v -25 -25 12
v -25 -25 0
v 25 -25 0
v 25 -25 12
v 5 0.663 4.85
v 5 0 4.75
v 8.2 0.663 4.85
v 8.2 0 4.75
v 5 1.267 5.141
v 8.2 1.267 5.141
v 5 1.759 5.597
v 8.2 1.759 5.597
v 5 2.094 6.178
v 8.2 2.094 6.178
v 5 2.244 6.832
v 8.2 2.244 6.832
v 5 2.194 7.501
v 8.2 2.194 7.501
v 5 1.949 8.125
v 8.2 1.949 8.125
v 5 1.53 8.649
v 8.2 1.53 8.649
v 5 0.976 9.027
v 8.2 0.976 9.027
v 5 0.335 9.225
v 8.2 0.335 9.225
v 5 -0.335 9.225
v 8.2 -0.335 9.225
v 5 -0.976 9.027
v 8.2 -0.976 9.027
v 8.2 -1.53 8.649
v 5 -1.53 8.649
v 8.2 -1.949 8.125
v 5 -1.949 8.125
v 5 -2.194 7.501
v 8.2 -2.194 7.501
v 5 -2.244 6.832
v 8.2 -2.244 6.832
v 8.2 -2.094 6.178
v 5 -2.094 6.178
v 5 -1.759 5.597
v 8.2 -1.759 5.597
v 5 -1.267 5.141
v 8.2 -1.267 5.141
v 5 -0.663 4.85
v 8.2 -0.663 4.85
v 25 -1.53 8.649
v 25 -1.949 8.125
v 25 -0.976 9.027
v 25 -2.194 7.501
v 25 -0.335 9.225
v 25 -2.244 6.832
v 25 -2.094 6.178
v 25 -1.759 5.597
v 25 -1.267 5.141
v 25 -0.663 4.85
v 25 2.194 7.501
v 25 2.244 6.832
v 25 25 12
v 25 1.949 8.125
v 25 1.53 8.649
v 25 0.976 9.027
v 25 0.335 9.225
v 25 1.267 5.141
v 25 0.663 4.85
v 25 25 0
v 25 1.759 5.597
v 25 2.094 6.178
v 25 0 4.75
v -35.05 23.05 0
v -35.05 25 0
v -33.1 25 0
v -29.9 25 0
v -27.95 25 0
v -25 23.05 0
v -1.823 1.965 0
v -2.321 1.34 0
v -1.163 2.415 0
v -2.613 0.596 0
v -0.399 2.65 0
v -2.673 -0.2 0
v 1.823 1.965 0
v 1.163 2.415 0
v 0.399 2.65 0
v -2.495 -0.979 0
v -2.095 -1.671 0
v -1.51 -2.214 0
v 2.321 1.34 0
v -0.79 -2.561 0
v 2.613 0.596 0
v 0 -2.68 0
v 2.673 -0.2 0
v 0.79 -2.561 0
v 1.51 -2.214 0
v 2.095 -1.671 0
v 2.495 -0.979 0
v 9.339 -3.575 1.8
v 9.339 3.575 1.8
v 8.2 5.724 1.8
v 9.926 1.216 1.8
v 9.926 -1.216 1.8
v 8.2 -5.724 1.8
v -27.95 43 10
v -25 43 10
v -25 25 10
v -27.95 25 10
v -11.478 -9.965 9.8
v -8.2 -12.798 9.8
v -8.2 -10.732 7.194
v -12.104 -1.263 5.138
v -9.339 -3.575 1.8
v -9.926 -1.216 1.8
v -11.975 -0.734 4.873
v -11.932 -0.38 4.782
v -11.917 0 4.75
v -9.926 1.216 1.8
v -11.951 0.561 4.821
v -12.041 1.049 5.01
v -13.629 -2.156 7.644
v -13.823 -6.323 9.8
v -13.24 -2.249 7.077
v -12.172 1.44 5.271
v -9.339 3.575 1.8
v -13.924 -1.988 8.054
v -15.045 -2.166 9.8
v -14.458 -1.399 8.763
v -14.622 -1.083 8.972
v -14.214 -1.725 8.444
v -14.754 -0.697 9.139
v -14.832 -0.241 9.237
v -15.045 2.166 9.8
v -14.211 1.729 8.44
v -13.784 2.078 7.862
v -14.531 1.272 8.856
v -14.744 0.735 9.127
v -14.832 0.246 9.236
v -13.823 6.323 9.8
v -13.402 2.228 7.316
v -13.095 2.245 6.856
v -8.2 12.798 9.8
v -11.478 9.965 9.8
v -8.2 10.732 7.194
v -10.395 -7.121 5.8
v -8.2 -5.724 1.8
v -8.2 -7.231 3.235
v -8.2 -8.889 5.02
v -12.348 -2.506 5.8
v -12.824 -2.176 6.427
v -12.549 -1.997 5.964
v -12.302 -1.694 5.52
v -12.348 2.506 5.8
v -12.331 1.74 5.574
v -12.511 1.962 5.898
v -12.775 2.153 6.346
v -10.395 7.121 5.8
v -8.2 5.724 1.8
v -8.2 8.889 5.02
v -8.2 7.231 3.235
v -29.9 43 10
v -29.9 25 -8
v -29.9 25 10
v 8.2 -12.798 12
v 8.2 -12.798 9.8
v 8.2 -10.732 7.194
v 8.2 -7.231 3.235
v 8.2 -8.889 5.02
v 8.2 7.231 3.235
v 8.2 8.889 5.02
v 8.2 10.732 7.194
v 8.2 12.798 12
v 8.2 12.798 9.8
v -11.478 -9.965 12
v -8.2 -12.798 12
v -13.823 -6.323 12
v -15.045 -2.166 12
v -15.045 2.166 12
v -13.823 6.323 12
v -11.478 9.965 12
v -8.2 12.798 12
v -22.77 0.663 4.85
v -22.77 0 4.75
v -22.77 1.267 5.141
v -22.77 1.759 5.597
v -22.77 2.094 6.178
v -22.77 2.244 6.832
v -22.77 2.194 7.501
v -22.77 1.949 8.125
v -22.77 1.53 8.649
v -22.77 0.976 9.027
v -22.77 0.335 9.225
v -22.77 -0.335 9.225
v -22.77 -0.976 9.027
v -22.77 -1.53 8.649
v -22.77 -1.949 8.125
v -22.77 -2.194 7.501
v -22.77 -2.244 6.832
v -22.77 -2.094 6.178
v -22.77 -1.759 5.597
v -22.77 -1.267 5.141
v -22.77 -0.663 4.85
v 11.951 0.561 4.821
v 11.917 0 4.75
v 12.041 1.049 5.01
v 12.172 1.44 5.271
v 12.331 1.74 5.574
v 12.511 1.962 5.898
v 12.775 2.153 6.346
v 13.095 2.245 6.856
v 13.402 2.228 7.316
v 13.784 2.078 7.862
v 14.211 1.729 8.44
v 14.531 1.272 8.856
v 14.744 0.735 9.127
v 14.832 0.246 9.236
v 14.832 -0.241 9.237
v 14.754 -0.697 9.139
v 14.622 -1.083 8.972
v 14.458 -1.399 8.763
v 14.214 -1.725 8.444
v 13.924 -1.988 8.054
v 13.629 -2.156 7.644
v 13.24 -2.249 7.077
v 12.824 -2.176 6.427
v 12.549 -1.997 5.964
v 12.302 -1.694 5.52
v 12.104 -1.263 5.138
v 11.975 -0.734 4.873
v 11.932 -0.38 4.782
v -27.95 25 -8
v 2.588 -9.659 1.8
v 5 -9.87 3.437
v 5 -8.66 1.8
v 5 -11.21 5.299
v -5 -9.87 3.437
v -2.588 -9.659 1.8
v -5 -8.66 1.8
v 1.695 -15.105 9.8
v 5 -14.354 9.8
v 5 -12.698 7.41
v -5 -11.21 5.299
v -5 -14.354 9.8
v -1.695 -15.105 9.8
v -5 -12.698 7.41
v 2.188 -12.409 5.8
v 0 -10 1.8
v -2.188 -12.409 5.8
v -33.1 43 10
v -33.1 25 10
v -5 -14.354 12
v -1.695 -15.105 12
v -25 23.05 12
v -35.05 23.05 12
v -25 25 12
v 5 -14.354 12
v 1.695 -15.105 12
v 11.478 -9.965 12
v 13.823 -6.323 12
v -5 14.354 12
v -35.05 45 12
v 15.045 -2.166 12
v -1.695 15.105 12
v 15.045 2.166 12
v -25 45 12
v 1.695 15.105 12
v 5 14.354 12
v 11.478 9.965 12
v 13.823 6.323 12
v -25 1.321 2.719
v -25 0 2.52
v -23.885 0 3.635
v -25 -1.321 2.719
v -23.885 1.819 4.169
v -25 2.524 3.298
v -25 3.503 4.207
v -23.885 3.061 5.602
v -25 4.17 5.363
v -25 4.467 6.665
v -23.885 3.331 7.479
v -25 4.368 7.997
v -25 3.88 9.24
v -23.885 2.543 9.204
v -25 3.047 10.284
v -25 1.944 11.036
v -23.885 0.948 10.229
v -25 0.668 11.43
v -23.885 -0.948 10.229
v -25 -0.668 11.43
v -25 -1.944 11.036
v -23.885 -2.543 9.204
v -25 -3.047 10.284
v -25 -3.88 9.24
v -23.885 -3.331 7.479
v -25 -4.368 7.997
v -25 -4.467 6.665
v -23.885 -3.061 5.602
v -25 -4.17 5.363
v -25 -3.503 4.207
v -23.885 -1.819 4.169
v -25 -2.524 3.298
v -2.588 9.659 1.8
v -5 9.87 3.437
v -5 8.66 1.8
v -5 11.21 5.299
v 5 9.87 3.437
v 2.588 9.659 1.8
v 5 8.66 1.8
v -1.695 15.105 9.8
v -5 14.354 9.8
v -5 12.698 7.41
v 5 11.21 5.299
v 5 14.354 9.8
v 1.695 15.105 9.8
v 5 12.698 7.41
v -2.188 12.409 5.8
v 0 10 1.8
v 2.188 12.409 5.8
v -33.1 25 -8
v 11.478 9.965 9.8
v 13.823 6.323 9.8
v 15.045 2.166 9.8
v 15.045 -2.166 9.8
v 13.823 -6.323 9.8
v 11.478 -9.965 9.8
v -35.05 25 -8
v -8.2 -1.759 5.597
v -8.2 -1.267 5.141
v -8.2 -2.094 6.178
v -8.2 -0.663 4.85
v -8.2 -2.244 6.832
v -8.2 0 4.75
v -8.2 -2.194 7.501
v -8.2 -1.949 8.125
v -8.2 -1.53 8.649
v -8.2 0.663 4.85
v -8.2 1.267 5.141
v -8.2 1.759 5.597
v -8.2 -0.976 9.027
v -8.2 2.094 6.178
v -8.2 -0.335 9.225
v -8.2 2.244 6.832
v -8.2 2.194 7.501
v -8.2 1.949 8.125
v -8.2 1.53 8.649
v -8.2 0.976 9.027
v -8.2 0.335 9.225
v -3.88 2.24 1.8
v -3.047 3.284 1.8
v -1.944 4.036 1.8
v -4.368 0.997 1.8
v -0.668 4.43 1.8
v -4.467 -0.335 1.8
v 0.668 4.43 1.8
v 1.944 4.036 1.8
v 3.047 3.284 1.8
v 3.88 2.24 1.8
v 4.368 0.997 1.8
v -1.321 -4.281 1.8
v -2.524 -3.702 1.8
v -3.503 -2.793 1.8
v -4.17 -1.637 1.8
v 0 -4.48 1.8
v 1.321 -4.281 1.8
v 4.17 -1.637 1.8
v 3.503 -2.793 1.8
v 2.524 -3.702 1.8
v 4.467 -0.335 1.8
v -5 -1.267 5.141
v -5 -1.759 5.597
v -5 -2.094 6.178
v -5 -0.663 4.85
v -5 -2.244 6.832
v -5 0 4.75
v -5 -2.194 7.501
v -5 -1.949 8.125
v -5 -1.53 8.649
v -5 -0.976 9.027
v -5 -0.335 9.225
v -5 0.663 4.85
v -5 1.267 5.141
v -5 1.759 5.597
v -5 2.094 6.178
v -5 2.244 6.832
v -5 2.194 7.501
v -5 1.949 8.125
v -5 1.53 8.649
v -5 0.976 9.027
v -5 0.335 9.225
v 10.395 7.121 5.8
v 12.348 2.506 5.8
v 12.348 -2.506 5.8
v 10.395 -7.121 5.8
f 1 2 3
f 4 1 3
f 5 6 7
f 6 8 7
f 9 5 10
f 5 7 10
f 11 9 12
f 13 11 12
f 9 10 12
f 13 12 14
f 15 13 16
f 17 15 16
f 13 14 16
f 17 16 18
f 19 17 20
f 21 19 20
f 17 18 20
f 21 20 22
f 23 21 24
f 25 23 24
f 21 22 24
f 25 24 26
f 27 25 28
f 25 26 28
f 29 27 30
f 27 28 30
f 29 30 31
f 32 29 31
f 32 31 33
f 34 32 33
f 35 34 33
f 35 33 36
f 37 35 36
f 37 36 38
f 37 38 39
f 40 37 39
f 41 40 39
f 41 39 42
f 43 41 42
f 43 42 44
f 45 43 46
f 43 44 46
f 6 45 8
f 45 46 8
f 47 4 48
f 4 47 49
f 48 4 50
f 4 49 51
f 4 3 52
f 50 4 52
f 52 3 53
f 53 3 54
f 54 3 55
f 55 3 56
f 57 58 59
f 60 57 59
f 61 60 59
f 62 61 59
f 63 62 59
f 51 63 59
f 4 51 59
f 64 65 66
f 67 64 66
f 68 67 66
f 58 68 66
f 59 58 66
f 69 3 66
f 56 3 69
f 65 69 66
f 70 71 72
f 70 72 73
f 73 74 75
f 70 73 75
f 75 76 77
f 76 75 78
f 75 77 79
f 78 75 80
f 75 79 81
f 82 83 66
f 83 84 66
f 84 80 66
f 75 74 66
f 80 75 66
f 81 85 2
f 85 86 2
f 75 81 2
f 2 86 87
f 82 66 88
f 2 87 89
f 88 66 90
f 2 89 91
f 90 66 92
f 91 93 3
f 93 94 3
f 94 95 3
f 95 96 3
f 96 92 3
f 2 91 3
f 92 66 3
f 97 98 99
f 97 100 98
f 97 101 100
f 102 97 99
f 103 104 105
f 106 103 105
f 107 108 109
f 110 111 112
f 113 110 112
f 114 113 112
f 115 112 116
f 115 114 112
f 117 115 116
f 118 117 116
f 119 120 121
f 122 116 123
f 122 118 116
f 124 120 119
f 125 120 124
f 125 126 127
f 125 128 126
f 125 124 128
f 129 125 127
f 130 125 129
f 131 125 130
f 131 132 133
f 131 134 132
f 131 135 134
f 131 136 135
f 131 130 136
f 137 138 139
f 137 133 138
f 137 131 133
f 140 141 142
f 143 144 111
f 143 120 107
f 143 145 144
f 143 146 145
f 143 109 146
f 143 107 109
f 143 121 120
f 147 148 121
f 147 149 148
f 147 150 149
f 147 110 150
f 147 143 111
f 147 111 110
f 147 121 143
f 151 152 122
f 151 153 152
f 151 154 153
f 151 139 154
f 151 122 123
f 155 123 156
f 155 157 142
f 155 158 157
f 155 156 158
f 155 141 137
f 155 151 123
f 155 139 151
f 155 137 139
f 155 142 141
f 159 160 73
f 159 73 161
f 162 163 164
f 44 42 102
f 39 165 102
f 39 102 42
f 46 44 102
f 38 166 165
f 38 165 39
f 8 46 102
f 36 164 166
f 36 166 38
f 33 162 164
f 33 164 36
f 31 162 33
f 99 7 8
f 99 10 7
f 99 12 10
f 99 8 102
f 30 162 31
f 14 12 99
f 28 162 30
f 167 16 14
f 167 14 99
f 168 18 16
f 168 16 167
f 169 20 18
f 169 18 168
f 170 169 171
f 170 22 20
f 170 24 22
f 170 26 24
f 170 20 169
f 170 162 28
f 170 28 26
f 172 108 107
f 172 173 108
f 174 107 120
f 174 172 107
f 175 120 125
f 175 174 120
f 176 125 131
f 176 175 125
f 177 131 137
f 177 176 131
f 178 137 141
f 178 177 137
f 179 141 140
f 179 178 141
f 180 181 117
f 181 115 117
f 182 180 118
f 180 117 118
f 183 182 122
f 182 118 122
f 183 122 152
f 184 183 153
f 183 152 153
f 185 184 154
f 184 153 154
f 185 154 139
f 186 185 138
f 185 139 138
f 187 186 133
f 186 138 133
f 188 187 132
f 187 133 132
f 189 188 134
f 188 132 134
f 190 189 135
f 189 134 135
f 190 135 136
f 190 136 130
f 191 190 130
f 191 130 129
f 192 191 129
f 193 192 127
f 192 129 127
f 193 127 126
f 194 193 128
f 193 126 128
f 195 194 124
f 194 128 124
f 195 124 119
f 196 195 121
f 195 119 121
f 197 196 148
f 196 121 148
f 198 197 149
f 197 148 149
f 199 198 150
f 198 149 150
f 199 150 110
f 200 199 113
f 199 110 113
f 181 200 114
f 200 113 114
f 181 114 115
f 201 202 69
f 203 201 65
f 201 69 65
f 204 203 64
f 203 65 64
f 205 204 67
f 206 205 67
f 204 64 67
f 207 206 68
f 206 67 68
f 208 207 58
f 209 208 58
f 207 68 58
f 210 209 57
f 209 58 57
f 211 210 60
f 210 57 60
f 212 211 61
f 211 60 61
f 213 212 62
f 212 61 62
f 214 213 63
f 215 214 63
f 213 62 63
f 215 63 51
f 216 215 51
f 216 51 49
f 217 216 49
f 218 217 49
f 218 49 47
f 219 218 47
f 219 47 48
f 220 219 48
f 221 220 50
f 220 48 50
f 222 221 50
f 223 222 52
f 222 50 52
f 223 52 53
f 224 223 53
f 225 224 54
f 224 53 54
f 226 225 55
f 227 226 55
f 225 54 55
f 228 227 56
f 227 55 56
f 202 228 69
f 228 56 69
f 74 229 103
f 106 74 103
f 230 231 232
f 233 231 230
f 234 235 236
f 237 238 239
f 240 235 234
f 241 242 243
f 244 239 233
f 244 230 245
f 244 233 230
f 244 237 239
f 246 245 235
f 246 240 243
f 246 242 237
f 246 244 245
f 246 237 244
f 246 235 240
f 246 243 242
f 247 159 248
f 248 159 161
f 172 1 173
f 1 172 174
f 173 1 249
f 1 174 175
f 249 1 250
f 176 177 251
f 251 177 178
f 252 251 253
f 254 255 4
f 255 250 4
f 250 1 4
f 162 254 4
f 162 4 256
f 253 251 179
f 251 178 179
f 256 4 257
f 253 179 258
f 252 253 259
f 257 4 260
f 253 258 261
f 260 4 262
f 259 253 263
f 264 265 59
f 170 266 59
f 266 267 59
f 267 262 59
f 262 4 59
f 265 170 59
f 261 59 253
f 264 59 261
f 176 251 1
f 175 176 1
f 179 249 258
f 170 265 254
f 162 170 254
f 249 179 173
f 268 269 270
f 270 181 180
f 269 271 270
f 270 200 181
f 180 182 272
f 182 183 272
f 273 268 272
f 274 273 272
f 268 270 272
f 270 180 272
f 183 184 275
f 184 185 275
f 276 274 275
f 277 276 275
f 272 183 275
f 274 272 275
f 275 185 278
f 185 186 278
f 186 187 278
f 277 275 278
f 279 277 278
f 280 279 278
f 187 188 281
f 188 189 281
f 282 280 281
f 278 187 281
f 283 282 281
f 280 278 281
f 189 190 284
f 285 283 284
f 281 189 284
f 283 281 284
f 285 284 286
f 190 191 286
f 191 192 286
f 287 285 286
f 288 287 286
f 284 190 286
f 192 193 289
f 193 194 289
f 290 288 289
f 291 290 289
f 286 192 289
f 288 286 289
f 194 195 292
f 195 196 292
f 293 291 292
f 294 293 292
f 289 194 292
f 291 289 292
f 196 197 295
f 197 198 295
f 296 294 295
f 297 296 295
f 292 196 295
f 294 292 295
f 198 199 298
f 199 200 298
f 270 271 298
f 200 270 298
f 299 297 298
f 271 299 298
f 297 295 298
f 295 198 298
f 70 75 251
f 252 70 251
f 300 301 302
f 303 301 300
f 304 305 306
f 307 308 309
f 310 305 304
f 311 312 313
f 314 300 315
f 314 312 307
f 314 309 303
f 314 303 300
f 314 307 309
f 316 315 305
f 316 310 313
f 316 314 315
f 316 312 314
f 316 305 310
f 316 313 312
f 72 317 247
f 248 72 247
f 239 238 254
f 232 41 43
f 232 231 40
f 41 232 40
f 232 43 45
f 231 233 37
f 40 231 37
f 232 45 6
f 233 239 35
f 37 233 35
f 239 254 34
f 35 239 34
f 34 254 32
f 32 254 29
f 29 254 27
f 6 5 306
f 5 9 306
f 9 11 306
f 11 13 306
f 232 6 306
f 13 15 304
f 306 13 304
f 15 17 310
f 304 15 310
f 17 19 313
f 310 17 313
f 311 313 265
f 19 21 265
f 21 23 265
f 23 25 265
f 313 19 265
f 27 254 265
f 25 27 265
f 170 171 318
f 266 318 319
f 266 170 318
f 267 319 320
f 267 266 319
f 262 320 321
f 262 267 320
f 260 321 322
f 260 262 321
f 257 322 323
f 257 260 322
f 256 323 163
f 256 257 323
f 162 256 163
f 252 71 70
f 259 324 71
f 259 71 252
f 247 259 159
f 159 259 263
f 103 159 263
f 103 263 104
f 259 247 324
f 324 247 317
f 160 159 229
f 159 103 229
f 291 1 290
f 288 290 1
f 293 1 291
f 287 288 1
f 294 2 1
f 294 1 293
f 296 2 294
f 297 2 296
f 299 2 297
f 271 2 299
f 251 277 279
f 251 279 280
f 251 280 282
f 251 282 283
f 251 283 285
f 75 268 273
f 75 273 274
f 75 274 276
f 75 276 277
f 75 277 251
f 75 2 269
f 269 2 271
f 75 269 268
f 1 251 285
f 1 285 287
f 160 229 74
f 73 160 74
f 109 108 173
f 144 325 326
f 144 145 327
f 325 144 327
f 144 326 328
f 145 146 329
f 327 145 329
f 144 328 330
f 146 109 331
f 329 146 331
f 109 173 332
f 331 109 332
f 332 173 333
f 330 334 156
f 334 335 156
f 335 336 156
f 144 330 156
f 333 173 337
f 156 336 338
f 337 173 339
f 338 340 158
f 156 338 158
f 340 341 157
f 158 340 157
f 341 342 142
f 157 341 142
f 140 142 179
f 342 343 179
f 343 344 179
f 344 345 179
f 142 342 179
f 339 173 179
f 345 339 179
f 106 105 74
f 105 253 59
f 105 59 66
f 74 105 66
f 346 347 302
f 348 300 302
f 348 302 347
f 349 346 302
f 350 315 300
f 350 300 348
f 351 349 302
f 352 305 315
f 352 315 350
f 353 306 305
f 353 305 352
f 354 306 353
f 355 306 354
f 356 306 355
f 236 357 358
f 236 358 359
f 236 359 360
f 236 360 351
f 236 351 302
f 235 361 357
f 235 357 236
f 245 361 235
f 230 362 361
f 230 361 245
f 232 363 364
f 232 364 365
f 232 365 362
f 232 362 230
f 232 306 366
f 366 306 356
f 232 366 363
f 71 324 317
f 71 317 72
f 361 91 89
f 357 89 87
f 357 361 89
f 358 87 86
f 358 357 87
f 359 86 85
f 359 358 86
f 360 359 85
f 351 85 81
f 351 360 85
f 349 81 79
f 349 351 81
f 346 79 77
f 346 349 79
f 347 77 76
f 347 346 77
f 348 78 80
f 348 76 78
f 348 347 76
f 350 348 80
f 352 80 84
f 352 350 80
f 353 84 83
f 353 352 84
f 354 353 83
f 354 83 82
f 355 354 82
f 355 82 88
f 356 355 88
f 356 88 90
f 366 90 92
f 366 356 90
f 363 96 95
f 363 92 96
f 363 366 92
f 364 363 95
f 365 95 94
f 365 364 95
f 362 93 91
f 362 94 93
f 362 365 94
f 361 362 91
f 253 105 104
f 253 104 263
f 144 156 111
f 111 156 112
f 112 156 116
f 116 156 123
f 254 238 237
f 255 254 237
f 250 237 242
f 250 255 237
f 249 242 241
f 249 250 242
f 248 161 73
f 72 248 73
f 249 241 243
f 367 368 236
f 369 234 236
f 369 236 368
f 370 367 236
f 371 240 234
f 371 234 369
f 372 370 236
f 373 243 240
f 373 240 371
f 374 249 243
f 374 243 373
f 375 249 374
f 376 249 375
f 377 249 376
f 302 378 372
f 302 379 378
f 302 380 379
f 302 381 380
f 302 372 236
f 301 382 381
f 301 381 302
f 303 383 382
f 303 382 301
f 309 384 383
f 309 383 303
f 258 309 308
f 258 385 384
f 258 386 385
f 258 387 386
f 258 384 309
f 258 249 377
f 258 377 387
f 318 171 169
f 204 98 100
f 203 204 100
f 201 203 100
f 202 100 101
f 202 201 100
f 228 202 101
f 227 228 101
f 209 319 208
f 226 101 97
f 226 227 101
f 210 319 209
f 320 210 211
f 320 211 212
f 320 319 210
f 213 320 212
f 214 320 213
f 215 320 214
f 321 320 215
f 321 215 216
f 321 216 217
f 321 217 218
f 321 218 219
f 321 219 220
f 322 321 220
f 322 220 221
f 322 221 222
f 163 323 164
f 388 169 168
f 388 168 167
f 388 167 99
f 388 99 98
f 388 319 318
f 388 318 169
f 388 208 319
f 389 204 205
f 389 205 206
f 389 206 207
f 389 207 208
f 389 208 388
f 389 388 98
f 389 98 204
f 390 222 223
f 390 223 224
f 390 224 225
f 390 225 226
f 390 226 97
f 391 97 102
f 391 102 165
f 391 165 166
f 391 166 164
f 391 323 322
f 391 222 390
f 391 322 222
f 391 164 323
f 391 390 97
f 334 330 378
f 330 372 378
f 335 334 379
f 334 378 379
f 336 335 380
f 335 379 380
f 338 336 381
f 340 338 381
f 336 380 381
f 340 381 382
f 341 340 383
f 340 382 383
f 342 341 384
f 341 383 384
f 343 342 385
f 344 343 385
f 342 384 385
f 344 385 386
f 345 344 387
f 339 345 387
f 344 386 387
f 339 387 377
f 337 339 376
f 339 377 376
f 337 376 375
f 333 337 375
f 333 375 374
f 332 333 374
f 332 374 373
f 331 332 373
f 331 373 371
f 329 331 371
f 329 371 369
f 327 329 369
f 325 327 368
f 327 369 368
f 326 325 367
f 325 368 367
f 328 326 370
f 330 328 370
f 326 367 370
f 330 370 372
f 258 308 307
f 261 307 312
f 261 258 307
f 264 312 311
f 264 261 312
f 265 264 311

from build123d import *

# Parameters (mm, degrees)
CROQUIS1_W                                           = 50
CROQUIS1_H                                           = 50
CROQUIS1_R                                           = 2
SALIENTE_EXTRUIR2_DEPTH                              = 12
CROQUIS4_W                                           = 3.2
CROQUIS4_H                                           = 40
SALIENTE_EXTRUIR5_DEPTH                              = 10.2
CORTAR_EXTRUIR2_START                                = -50
CROQUIS7_R                                           = 2
CORTAR_EXTRUIR2_DEPTH                                = 50
REFRENTADO_PARA_TORNILLO_TAP_N_CON_CABEZ_D           = 4.5
REFRENTADO_PARA_TORNILLO_TAP_N_CON_CABEZ_CSINK_D     = 8.96
REFRENTADO_PARA_TORNILLO_TAP_N_CON_CABEZ_CSINK_ANGLE = 90
SALIENTE_EXTRUIR14_DEPTH                             = 10.05
SALIENTE_EXTRUIR15_START                             = 2.95
SALIENTE_EXTRUIR15_DEPTH                             = 1.95
SALIENTE_EXTRUIR16_START                             = 10.05
SALIENTE_EXTRUIR16_DEPTH                             = 1.95


with BuildPart() as part:
    # Croquis1 → Saliente-Extruir2 (new body)
    with BuildSketch(Plane.XY):
        Rectangle(CROQUIS1_W, CROQUIS1_H)
        Circle(CROQUIS1_R, mode=Mode.SUBTRACT)
    extrude(amount=SALIENTE_EXTRUIR2_DEPTH)

    # Croquis2 → Cortar-Revolución1 (revolve, cut)
    with BuildSketch(Plane(origin=(0, 0, 0), x_dir=(0, 0, -1), z_dir=(1, 0, 0))):
        Polygon((-12, 15.2), (-12, 0), (-1.8, 0), (-1.8, 10), (-9.8, 15.2), align=None)
    revolve(axis=Axis((0, 0, 12), (0, 0, -1)), mode=Mode.SUBTRACT)

    # Croquis4 → Saliente-Extruir5 (add)
    with BuildSketch(Plane.XY.offset(12)):
        with Locations((-6.6, 0)):
            Rectangle(CROQUIS4_W, CROQUIS4_H)
        with Locations((6.6, 0)):
            Rectangle(CROQUIS4_W, CROQUIS4_H)
    extrude(amount=-SALIENTE_EXTRUIR5_DEPTH)

    # Croquis7 → Cortar-Extruir2 (cut)
    with BuildSketch(Plane.ZY.offset(25).offset(CORTAR_EXTRUIR2_START)):
        with Locations((7, 0)):
            Circle(CROQUIS7_R)
    extrude(amount=CORTAR_EXTRUIR2_DEPTH, mode=Mode.SUBTRACT)

    # Refrentado para tornillo tap_n con cabez (through all)
    with Locations(Plane.ZY.offset(25)):
        with Locations((7, 0)):
            CounterSinkHole(REFRENTADO_PARA_TORNILLO_TAP_N_CON_CABEZ_D / 2, REFRENTADO_PARA_TORNILLO_TAP_N_CON_CABEZ_CSINK_D / 2, counter_sink_angle=REFRENTADO_PARA_TORNILLO_TAP_N_CON_CABEZ_CSINK_ANGLE)

    # Croquis17 → Refrentado para tornillo tap_n con c 2 (revolve, cut)
    with BuildSketch(Plane(origin=(0, 0, 1.8), x_dir=(0, -1, 0), z_dir=(1, 0, 0))):
        Polygon((0, 0), (0, 1.8), (2.25, 1.8), (2.25, 2.23), (4.48, 0), align=None)
    revolve(axis=Axis((0, 0, 8.15), (0, 0, -1)), mode=Mode.SUBTRACT)

    # Croquis19 → Saliente-Extruir14 (add)
    with BuildSketch(Plane.ZY.offset(25)):
        Polygon((12, 45), (10, 43), (10, 25), (0, 25), (0, 23.05), (10, 23.05), (12, 23.05), (12, 25), align=None)
    extrude(amount=SALIENTE_EXTRUIR14_DEPTH)

    # Croquis12 → Saliente-Extruir15 (add)
    with BuildSketch(Plane.ZY.offset(25).offset(SALIENTE_EXTRUIR15_START)):
        Polygon((12, 45), (-8, 25), (12, 25), align=None)
    extrude(amount=SALIENTE_EXTRUIR15_DEPTH)

    # Croquis12<3> → Saliente-Extruir16 (add)
    with BuildSketch(Plane.ZY.offset(25).offset(SALIENTE_EXTRUIR16_START)):
        Polygon((12, 45), (-8, 25), (12, 25), align=None)
    extrude(amount=-SALIENTE_EXTRUIR16_DEPTH)


solid = part.part
